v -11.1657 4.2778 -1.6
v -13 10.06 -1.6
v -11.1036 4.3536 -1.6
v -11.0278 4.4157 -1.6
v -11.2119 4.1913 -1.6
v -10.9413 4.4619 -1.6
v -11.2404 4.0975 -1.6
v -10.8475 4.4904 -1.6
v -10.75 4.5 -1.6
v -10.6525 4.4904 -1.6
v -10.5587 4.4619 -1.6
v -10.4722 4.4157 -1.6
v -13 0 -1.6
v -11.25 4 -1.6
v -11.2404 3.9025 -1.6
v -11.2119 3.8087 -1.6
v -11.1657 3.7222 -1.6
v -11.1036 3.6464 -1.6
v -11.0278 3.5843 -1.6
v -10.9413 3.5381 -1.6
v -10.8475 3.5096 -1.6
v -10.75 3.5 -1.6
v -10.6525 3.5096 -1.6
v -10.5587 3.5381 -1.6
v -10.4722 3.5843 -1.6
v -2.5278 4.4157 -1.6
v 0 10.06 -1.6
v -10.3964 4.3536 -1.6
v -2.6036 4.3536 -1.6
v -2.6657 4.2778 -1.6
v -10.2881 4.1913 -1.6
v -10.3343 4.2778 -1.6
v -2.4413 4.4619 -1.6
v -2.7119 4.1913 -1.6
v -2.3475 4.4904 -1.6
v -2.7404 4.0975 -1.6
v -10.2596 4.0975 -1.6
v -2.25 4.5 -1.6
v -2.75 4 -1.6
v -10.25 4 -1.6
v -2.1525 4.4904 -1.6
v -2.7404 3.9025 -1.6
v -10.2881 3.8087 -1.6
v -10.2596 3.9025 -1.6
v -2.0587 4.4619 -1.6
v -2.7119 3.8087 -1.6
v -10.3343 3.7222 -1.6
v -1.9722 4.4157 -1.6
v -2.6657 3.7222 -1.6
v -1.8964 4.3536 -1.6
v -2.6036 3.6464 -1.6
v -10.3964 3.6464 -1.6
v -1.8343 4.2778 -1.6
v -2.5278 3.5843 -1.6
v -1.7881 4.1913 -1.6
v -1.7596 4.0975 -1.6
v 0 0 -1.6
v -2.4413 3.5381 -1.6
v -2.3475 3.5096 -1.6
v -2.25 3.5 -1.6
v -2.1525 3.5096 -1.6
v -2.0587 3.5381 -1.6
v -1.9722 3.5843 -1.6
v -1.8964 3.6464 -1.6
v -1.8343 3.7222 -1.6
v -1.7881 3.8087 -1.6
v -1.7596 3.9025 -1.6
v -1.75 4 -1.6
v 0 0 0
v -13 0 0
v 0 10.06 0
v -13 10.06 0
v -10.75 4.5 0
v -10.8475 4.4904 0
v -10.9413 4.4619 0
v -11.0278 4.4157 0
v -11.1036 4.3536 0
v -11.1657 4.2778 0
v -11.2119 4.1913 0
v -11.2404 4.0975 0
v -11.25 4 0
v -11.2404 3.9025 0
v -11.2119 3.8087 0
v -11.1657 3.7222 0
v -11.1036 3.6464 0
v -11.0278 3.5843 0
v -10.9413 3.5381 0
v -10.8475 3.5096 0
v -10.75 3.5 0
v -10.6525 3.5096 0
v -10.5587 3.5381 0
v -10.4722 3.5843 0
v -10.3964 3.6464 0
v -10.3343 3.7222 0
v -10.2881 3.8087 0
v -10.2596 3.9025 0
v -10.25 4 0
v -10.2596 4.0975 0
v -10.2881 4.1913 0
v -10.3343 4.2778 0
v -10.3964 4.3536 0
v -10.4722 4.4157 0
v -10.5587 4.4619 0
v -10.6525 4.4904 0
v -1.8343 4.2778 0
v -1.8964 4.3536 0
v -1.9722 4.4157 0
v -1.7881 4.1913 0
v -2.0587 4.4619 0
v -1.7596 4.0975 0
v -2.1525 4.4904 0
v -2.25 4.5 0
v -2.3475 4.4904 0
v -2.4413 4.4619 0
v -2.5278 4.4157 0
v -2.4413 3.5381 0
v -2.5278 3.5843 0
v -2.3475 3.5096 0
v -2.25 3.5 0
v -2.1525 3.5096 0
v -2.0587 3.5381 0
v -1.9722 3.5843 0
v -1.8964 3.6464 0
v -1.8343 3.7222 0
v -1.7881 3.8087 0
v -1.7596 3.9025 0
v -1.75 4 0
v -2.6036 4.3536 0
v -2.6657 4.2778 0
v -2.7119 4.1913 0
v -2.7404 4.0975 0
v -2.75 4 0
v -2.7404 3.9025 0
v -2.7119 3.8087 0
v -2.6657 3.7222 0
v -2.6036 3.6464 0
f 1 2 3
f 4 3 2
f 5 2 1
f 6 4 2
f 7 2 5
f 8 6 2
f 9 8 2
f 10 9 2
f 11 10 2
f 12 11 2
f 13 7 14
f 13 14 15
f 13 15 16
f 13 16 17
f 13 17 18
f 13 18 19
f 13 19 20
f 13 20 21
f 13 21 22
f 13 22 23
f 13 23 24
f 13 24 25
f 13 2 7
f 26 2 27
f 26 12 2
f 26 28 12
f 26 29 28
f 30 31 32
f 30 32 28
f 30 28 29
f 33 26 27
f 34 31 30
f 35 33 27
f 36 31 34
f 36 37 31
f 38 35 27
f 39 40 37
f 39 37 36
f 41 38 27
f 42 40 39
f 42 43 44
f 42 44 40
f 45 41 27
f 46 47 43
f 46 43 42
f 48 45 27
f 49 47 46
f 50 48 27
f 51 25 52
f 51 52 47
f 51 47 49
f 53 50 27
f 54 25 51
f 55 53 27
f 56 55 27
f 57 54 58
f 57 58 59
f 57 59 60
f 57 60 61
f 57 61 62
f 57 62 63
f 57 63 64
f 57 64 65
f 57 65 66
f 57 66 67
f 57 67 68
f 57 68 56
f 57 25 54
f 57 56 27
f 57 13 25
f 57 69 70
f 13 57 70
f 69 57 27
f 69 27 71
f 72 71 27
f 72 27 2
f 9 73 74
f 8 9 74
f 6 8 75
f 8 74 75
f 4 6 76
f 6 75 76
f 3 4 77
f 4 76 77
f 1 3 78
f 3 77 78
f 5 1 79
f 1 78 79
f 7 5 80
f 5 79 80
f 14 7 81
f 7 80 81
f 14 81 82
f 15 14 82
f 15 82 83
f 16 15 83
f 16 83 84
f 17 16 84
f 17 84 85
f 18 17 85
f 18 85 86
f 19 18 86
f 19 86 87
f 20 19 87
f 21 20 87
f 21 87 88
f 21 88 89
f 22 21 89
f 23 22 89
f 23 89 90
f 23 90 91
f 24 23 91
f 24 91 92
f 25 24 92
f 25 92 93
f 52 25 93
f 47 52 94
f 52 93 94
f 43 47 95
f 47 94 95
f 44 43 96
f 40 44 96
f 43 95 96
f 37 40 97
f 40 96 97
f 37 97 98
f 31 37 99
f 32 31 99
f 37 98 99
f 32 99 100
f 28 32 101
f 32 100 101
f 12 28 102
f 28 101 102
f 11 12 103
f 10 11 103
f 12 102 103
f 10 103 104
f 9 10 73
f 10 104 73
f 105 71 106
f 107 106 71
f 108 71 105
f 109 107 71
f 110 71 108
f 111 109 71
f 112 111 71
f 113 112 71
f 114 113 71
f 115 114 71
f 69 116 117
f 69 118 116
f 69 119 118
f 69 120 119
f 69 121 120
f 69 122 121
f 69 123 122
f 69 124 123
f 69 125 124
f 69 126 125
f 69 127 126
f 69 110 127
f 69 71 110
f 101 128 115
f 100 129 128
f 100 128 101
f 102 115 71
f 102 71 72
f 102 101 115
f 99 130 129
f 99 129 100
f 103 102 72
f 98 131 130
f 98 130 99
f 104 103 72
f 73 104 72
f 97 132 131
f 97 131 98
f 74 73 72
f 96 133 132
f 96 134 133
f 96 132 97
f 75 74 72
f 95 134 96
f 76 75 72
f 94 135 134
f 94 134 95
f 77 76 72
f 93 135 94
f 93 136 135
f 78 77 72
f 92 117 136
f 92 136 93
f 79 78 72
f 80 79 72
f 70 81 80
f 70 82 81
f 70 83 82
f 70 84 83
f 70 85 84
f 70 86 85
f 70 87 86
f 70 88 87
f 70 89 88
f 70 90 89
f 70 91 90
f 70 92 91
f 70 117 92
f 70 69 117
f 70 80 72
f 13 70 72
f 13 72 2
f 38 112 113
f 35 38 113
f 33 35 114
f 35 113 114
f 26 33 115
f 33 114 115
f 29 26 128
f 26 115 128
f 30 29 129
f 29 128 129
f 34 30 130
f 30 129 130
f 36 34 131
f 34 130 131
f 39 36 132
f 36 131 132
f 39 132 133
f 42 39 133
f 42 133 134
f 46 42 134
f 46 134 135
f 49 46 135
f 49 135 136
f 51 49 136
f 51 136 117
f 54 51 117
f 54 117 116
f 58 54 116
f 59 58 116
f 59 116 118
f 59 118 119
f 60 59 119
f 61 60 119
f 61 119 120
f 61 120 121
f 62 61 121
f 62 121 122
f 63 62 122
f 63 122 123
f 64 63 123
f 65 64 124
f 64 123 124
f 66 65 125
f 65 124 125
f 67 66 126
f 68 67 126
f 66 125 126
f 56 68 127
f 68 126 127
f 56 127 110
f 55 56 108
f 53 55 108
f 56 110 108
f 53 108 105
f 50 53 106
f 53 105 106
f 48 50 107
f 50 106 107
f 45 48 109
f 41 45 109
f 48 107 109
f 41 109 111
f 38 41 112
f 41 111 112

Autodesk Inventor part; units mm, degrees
ref_plane "YZ Plane" through (0, 0, 0) normal (1, 0, 0) x (0, 1, 0)
ref_plane "XZ Plane" through (0, 0, 0) normal (0, 1, 0) x (-1, 0, 0)
ref_plane "XY Plane" through (0, 0, 0) normal (0, 0, 1) x (1, 0, 0)
sketch "Boceto1" plane through (0, 0, 0) normal (0, 1, 0) x (-1, 0, 0)
  line L0 (0, 0) -> (13, 0)
  line L1 (13, 0) -> (13, -1.6)
  line L2 (13, -1.6) -> (0, -1.6)
  line L3 (0, -1.6) -> (0, 0)
  dimension "d0" = 13
  dimension "d1" = 1.6
extrude "Extrusión1" add sketch "Boceto1" along normal blind 10.06
sketch "Boceto3" plane through (0, 0, -1.6) normal (0, 0, -1) x (-1, 0, 0)
  circle A0 centre (2.25, 4) radius 0.5
  circle A1 centre (10.75, 4) radius 0.5
  line L0 (0, 0) -> (13, 0) projected
  dimension "d12" = 1
  dimension "d13" = 1
  dimension "d21" = 4
hole "Agujero1" at (-2.25, 4, -1.6) at (-10.75, 4, -1.6) at (-10.75, 4, -1.6) direction (0, 0, 1) diameter 1 end through all
properties part number "Placa Cobre" material "Cobre"
